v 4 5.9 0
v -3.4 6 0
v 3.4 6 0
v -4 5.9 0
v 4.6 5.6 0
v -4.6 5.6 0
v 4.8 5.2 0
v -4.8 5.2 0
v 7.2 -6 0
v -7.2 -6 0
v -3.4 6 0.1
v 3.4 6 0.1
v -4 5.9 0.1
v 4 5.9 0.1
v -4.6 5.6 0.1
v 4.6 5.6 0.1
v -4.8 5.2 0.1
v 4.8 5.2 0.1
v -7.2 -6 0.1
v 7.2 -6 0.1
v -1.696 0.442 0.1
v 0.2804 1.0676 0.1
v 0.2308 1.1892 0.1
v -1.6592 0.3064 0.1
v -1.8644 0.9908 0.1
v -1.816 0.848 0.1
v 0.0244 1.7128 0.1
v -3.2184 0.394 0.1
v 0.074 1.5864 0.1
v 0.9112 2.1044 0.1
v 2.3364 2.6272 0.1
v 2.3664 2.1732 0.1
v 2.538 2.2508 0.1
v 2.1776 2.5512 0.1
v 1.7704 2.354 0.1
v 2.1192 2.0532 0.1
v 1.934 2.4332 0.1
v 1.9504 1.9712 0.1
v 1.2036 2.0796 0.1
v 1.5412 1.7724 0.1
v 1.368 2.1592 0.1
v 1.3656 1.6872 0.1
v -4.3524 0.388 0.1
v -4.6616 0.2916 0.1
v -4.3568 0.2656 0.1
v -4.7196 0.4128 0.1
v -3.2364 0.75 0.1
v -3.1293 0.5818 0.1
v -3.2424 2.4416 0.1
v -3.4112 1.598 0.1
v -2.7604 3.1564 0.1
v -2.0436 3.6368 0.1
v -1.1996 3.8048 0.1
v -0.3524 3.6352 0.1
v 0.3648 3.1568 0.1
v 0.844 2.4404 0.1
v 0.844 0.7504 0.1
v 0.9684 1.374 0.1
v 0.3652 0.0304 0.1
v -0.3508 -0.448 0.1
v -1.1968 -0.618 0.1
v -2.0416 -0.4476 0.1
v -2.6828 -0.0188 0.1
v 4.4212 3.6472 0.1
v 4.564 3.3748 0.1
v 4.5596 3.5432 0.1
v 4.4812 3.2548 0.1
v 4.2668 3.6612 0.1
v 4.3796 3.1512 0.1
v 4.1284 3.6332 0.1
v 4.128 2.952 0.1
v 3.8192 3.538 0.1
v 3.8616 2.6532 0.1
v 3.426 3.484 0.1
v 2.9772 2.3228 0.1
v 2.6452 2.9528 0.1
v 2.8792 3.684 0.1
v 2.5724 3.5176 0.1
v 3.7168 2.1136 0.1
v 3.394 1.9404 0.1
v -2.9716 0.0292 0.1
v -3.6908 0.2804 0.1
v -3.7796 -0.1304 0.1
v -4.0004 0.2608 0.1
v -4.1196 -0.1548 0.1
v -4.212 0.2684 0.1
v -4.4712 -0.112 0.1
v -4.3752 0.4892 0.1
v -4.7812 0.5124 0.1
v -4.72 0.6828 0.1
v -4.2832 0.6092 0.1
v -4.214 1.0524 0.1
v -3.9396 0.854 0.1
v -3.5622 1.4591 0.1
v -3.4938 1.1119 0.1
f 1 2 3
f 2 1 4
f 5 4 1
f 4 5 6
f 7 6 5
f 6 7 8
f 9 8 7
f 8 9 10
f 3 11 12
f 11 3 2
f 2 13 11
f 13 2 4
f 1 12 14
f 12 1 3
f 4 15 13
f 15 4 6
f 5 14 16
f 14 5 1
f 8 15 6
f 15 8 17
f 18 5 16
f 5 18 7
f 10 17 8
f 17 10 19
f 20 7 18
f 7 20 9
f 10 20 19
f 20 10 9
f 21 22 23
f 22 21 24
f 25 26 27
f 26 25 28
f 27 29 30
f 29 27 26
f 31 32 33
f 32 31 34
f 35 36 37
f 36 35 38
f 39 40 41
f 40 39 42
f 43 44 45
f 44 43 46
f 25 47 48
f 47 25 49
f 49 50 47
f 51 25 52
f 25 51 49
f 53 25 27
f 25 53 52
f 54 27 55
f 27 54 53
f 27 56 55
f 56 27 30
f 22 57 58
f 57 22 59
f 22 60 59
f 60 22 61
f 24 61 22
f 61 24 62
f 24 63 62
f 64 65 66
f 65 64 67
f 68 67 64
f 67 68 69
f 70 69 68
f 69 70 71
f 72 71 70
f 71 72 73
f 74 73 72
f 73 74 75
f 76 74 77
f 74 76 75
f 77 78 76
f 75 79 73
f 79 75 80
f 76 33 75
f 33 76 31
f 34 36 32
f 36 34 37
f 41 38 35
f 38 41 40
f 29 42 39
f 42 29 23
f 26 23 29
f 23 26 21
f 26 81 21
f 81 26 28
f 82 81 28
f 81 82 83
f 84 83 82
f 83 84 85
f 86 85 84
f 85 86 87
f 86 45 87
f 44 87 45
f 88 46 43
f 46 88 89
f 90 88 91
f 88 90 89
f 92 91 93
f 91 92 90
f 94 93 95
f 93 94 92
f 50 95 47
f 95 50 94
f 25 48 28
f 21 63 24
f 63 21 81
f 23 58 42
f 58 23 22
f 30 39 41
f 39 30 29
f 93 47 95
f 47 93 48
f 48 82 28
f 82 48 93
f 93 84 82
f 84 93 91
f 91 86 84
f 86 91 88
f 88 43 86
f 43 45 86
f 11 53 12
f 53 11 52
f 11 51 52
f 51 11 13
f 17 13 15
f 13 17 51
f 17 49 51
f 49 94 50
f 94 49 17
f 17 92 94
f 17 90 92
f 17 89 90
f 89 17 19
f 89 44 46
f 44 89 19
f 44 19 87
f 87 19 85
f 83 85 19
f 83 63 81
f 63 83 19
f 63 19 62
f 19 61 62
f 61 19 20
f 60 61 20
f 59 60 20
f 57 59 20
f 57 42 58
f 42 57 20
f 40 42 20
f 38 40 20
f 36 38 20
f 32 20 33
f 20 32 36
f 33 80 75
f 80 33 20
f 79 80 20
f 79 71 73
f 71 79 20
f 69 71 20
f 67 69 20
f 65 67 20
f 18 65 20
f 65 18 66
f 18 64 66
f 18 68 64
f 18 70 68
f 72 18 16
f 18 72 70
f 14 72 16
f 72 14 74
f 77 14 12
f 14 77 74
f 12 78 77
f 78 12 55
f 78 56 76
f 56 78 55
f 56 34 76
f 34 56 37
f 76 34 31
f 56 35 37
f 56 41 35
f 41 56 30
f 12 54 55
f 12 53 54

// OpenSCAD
// file: ../p/4-4edge.scad
use <../lib.scad>
$fa=1; $fs=0.2;
function ldraw_lib__4_4edge(realsolid=false) = [
// 0 Circle 1.0
// 0 Name: 4-4edge.dat
// 0 Author: James Jessiman
// 0 !LDRAW_ORG Primitive UPDATE 2017-01
// 0 !LICENSE Licensed under CC BY 2.0 and CC BY 4.0 : see CAreadme.txt
// 
// 0 BFC CERTIFY CCW
  [0,"BFC","CERTIFY"],
  [0,"BFC","CCW"],
// 
// 0 !HISTORY 1998-12-15 [PTadmin] Official Update 1998-10
// 0 !HISTORY 2005-12-28 [PTadmin] Official Update 2005-01
// 0 !HISTORY 2007-06-24 [PTadmin] Header formatted for Contributor Agreement
// 0 !HISTORY 2008-07-01 [PTadmin] Official Update 2008-01
// 0 !HISTORY 2017-01-15 [Steffen] BFCed
// 0 !HISTORY 2017-12-30 [PTadmin] Official Update 2017-01
// 
// 
// 2 24 1 0 0 0.9239 0 0.3827
  [2,24,1,0,0,0.9239,0,0.3827],
// 2 24 0.9239 0 0.3827 0.7071 0 0.7071
  [2,24,0.9239,0,0.3827,0.7071,0,0.7071],
// 2 24 0.7071 0 0.7071 0.3827 0 0.9239
  [2,24,0.7071,0,0.7071,0.3827,0,0.9239],
// 2 24 0.3827 0 0.9239 0 0 1
  [2,24,0.3827,0,0.9239,0,0,1],
// 2 24 0 0 1 -0.3827 0 0.9239
  [2,24,0,0,1,-0.3827,0,0.9239],
// 2 24 -0.3827 0 0.9239 -0.7071 0 0.7071
  [2,24,-0.3827,0,0.9239,-0.7071,0,0.7071],
// 2 24 -0.7071 0 0.7071 -0.9239 0 0.3827
  [2,24,-0.7071,0,0.7071,-0.9239,0,0.3827],
// 2 24 -0.9239 0 0.3827 -1 0 -0
  [2,24,-0.9239,0,0.3827,-1,0,-0],
// 2 24 -1 0 -0 -0.9239 0 -0.3827
  [2,24,-1,0,-0,-0.9239,0,-0.3827],
// 2 24 -0.9239 0 -0.3827 -0.7071 0 -0.7071
  [2,24,-0.9239,0,-0.3827,-0.7071,0,-0.7071],
// 2 24 -0.7071 0 -0.7071 -0.3827 0 -0.9239
  [2,24,-0.7071,0,-0.7071,-0.3827,0,-0.9239],
// 2 24 -0.3827 0 -0.9239 0 0 -1
  [2,24,-0.3827,0,-0.9239,0,0,-1],
// 2 24 0 0 -1 0.3827 0 -0.9239
  [2,24,0,0,-1,0.3827,0,-0.9239],
// 2 24 0.3827 0 -0.9239 0.7071 0 -0.7071
  [2,24,0.3827,0,-0.9239,0.7071,0,-0.7071],
// 2 24 0.7071 0 -0.7071 0.9239 0 -0.3827
  [2,24,0.7071,0,-0.7071,0.9239,0,-0.3827],
// 2 24 0.9239 0 -0.3827 1 0 0
  [2,24,0.9239,0,-0.3827,1,0,0],
];
module ldraw_lib__4_4edge(step=0, col=false, unit=2/5, alt=false, line=0.2, solid=!$preview)
    makepoly(ldraw_lib__4_4edge(solid), step=step, col=col, unit=unit, alt=alt, line=line, solid=solid);
ldraw_lib__4_4edge(line=0.2);
// file: ../p/4-4disc.scad
use <../lib.scad>
$fa=1; $fs=0.2;
function ldraw_lib__4_4disc(realsolid=false) = [
// 0 Disc 1.0
// 0 Name: 4-4disc.dat
// 0 Author: James Jessiman
// 0 !LDRAW_ORG Primitive UPDATE 2002-02
// 0 !LICENSE Licensed under CC BY 2.0 and CC BY 4.0 : see CAreadme.txt
// 
// 0 BFC CERTIFY CCW
  [0,"BFC","CERTIFY"],
  [0,"BFC","CCW"],
// 
// 0 !HISTORY 1998-12-15 [PTadmin] Official Update 1998-10
// 0 !HISTORY 2002-03-23 [sbliss] Added BFC statement
// 0 !HISTORY 2002-04-25 [PTadmin] Official Update 2002-02
// 0 !HISTORY 2007-06-24 [PTadmin] Header formatted for Contributor Agreement
// 0 !HISTORY 2008-07-01 [PTadmin] Official Update 2008-01
// 
// 
// 3 16 0 0 0 1 0 0 0.9239 0 0.3827
  [3,16,0,0,0,1,0,0,0.9239,0,0.3827],
// 3 16 0 0 0 0.9239 0 0.3827 0.7071 0 0.7071
  [3,16,0,0,0,0.9239,0,0.3827,0.7071,0,0.7071],
// 3 16 0 0 0 0.7071 0 0.7071 0.3827 0 0.9239
  [3,16,0,0,0,0.7071,0,0.7071,0.3827,0,0.9239],
// 3 16 0 0 0 0.3827 0 0.9239 0 0 1
  [3,16,0,0,0,0.3827,0,0.9239,0,0,1],
// 3 16 0 0 0 0 0 1 -0.3827 0 0.9239
  [3,16,0,0,0,0,0,1,-0.3827,0,0.9239],
// 3 16 0 0 0 -0.3827 0 0.9239 -0.7071 0 0.7071
  [3,16,0,0,0,-0.3827,0,0.9239,-0.7071,0,0.7071],
// 3 16 0 0 0 -0.7071 0 0.7071 -0.9239 0 0.3827
  [3,16,0,0,0,-0.7071,0,0.7071,-0.9239,0,0.3827],
// 3 16 0 0 0 -0.9239 0 0.3827 -1 0 -0
  [3,16,0,0,0,-0.9239,0,0.3827,-1,0,-0],
// 3 16 0 0 0 -1 0 -0 -0.9239 0 -0.3827
  [3,16,0,0,0,-1,0,-0,-0.9239,0,-0.3827],
// 3 16 0 0 0 -0.9239 0 -0.3827 -0.7071 0 -0.7071
  [3,16,0,0,0,-0.9239,0,-0.3827,-0.7071,0,-0.7071],
// 3 16 0 0 0 -0.7071 0 -0.7071 -0.3827 0 -0.9239
  [3,16,0,0,0,-0.7071,0,-0.7071,-0.3827,0,-0.9239],
// 3 16 0 0 0 -0.3827 0 -0.9239 0 0 -1
  [3,16,0,0,0,-0.3827,0,-0.9239,0,0,-1],
// 3 16 0 0 0 0 0 -1 0.3827 0 -0.9239
  [3,16,0,0,0,0,0,-1,0.3827,0,-0.9239],
// 3 16 0 0 0 0.3827 0 -0.9239 0.7071 0 -0.7071
  [3,16,0,0,0,0.3827,0,-0.9239,0.7071,0,-0.7071],
// 3 16 0 0 0 0.7071 0 -0.7071 0.9239 0 -0.3827
  [3,16,0,0,0,0.7071,0,-0.7071,0.9239,0,-0.3827],
// 3 16 0 0 0 0.9239 0 -0.3827 1 0 0
  [3,16,0,0,0,0.9239,0,-0.3827,1,0,0],
// 0
];
module ldraw_lib__4_4disc(step=0, col=false, unit=2/5, alt=false, line=0.2, solid=!$preview)
    makepoly(ldraw_lib__4_4disc(solid), step=step, col=col, unit=unit, alt=alt, line=line, solid=solid);
ldraw_lib__4_4disc(line=0.2);
// file: ../p/4-4cyli.scad
use <../lib.scad>
$fa=1; $fs=0.2;
function ldraw_lib__4_4cyli(realsolid=false) = [
// 0 Cylinder 1.0
// 0 Name: 4-4cyli.dat
// 0 Author: James Jessiman
// 0 !LDRAW_ORG Primitive UPDATE 2005-01
// 0 !LICENSE Licensed under CC BY 2.0 and CC BY 4.0 : see CAreadme.txt
// 
// 0 BFC CERTIFY CCW
  [0,"BFC","CERTIFY"],
  [0,"BFC","CCW"],
// 
// 0 !HISTORY 1998-12-15 [PTadmin] Official Update 1998-10
// 0 !HISTORY 2002-03-23 [sbliss] Added BFC statement; merged headers from files in distributions LDraw 0.27 and Complete.
// 0 !HISTORY 2002-04-25 [PTadmin] Official Update 2002-02
// 0 !HISTORY 2004-12-14 [guyvivan] BFC CCW
// 0 !HISTORY 2005-12-28 [PTadmin] Official Update 2005-01
// 0 !HISTORY 2007-06-24 [PTadmin] Header formatted for Contributor Agreement
// 0 !HISTORY 2008-07-01 [PTadmin] Official Update 2008-01
// 
// 
// 4 16 1 1 0 0.9239 1 0.3827 0.9239 0 0.3827 1 0 0
  [4,16,1,1,0,0.9239,1,0.3827,0.9239,0,0.3827,1,0,0],
// 5 24 1 0 0 1 1 0 0.9239 0 0.3827 0.9239 0 -0.3827
  [5,24,1,0,0,1,1,0,0.9239,0,0.3827,0.9239,0,-0.3827],
// 4 16 0.9239 1 0.3827 0.7071 1 0.7071 0.7071 0 0.7071 0.9239 0 0.3827
  [4,16,0.9239,1,0.3827,0.7071,1,0.7071,0.7071,0,0.7071,0.9239,0,0.3827],
// 5 24 0.9239 0 0.3827 0.9239 1 0.3827 0.7071 0 0.7071 1 0 0
  [5,24,0.9239,0,0.3827,0.9239,1,0.3827,0.7071,0,0.7071,1,0,0],
// 4 16 0.7071 1 0.7071 0.3827 1 0.9239 0.3827 0 0.9239 0.7071 0 0.7071
  [4,16,0.7071,1,0.7071,0.3827,1,0.9239,0.3827,0,0.9239,0.7071,0,0.7071],
// 5 24 0.7071 0 0.7071 0.7071 1 0.7071 0.3827 0 0.9239 0.9239 0 0.3827
  [5,24,0.7071,0,0.7071,0.7071,1,0.7071,0.3827,0,0.9239,0.9239,0,0.3827],
// 4 16 0.3827 1 0.9239 0 1 1 0 0 1 0.3827 0 0.9239
  [4,16,0.3827,1,0.9239,0,1,1,0,0,1,0.3827,0,0.9239],
// 5 24 0.3827 0 0.9239 0.3827 1 0.9239 0 0 1 0.7071 0 0.7071
  [5,24,0.3827,0,0.9239,0.3827,1,0.9239,0,0,1,0.7071,0,0.7071],
// 4 16 0 1 1 -0.3827 1 0.9239 -0.3827 0 0.9239 0 0 1
  [4,16,0,1,1,-0.3827,1,0.9239,-0.3827,0,0.9239,0,0,1],
// 5 24 0 0 1 0 1 1 -0.3827 0 0.9239 0.3827 0 0.9239
  [5,24,0,0,1,0,1,1,-0.3827,0,0.9239,0.3827,0,0.9239],
// 4 16 -0.3827 1 0.9239 -0.7071 1 0.7071 -0.7071 0 0.7071 -0.3827 0 0.9239
  [4,16,-0.3827,1,0.9239,-0.7071,1,0.7071,-0.7071,0,0.7071,-0.3827,0,0.9239],
// 5 24 -0.3827 0 0.9239 -0.3827 1 0.9239 -0.7071 0 0.7071 0 0 1
  [5,24,-0.3827,0,0.9239,-0.3827,1,0.9239,-0.7071,0,0.7071,0,0,1],
// 4 16 -0.7071 1 0.7071 -0.9239 1 0.3827 -0.9239 0 0.3827 -0.7071 0 0.7071
  [4,16,-0.7071,1,0.7071,-0.9239,1,0.3827,-0.9239,0,0.3827,-0.7071,0,0.7071],
// 5 24 -0.7071 0 0.7071 -0.7071 1 0.7071 -0.9239 0 0.3827 -0.3827 0 0.9239
  [5,24,-0.7071,0,0.7071,-0.7071,1,0.7071,-0.9239,0,0.3827,-0.3827,0,0.9239],
// 4 16 -0.9239 1 0.3827 -1 1 0 -1 0 0 -0.9239 0 0.3827
  [4,16,-0.9239,1,0.3827,-1,1,0,-1,0,0,-0.9239,0,0.3827],
// 5 24 -0.9239 0 0.3827 -0.9239 1 0.3827 -1 0 0 -0.7071 0 0.7071
  [5,24,-0.9239,0,0.3827,-0.9239,1,0.3827,-1,0,0,-0.7071,0,0.7071],
// 4 16 -1 1 0 -0.9239 1 -0.3827 -0.9239 0 -0.3827 -1 0 0
  [4,16,-1,1,0,-0.9239,1,-0.3827,-0.9239,0,-0.3827,-1,0,0],
// 5 24 -1 0 0 -1 1 0 -0.9239 0 -0.3827 -0.9239 0 0.3827
  [5,24,-1,0,0,-1,1,0,-0.9239,0,-0.3827,-0.9239,0,0.3827],
// 4 16 -0.9239 1 -0.3827 -0.7071 1 -0.7071 -0.7071 0 -0.7071 -0.9239 0 -0.3827
  [4,16,-0.9239,1,-0.3827,-0.7071,1,-0.7071,-0.7071,0,-0.7071,-0.9239,0,-0.3827],
// 5 24 -0.9239 0 -0.3827 -0.9239 1 -0.3827 -0.7071 0 -0.7071 -1 0 0
  [5,24,-0.9239,0,-0.3827,-0.9239,1,-0.3827,-0.7071,0,-0.7071,-1,0,0],
// 4 16 -0.7071 1 -0.7071 -0.3827 1 -0.9239 -0.3827 0 -0.9239 -0.7071 0 -0.7071
  [4,16,-0.7071,1,-0.7071,-0.3827,1,-0.9239,-0.3827,0,-0.9239,-0.7071,0,-0.7071],
// 5 24 -0.7071 0 -0.7071 -0.7071 1 -0.7071 -0.3827 0 -0.9239 -0.9239 0 -0.3827
  [5,24,-0.7071,0,-0.7071,-0.7071,1,-0.7071,-0.3827,0,-0.9239,-0.9239,0,-0.3827],
// 4 16 -0.3827 1 -0.9239 0 1 -1 0 0 -1 -0.3827 0 -0.9239
  [4,16,-0.3827,1,-0.9239,0,1,-1,0,0,-1,-0.3827,0,-0.9239],
// 5 24 -0.3827 0 -0.9239 -0.3827 1 -0.9239 0 0 -1 -0.7071 0 -0.7071
  [5,24,-0.3827,0,-0.9239,-0.3827,1,-0.9239,0,0,-1,-0.7071,0,-0.7071],
// 4 16 0 1 -1 0.3827 1 -0.9239 0.3827 0 -0.9239 0 0 -1
  [4,16,0,1,-1,0.3827,1,-0.9239,0.3827,0,-0.9239,0,0,-1],
// 5 24 0 0 -1 0 1 -1 0.3827 0 -0.9239 -0.3827 0 -0.9239
  [5,24,0,0,-1,0,1,-1,0.3827,0,-0.9239,-0.3827,0,-0.9239],
// 4 16 0.3827 1 -0.9239 0.7071 1 -0.7071 0.7071 0 -0.7071 0.3827 0 -0.9239
  [4,16,0.3827,1,-0.9239,0.7071,1,-0.7071,0.7071,0,-0.7071,0.3827,0,-0.9239],
// 5 24 0.3827 0 -0.9239 0.3827 1 -0.9239 0.7071 0 -0.7071 0 0 -1
  [5,24,0.3827,0,-0.9239,0.3827,1,-0.9239,0.7071,0,-0.7071,0,0,-1],
// 4 16 0.7071 1 -0.7071 0.9239 1 -0.3827 0.9239 0 -0.3827 0.7071 0 -0.7071
  [4,16,0.7071,1,-0.7071,0.9239,1,-0.3827,0.9239,0,-0.3827,0.7071,0,-0.7071],
// 5 24 0.7071 0 -0.7071 0.7071 1 -0.7071 0.9239 0 -0.3827 0.3827 0 -0.9239
  [5,24,0.7071,0,-0.7071,0.7071,1,-0.7071,0.9239,0,-0.3827,0.3827,0,-0.9239],
// 4 16 0.9239 1 -0.3827 1 1 0 1 0 0 0.9239 0 -0.3827
  [4,16,0.9239,1,-0.3827,1,1,0,1,0,0,0.9239,0,-0.3827],
// 5 24 0.9239 0 -0.3827 0.9239 1 -0.3827 1 0 0 0.7071 0 -0.7071
  [5,24,0.9239,0,-0.3827,0.9239,1,-0.3827,1,0,0,0.7071,0,-0.7071],
// 0
];
module ldraw_lib__4_4cyli(step=0, col=false, unit=2/5, alt=false, line=0.2, solid=!$preview)
    makepoly(ldraw_lib__4_4cyli(solid), step=step, col=col, unit=unit, alt=alt, line=line, solid=solid);
ldraw_lib__4_4cyli(line=0.2);
// file: ../p/stud3.scad
use <../lib.scad>
use <4-4cyli.scad>
use <4-4disc.scad>
use <4-4edge.scad>
$fa=1; $fs=0.2;
function ldraw_lib__stud3(realsolid=false) = realsolid ? 
    [openscad(translate([0,0,-eps()], o=cylinder(4+eps(), r=4)),2)] : [
// 0 Stud Tube Solid
// 0 Name: stud3.dat
// 0 Author: James Jessiman
// 0 !LDRAW_ORG Primitive UPDATE 2012-01
// 0 !LICENSE Licensed under CC BY 2.0 and CC BY 4.0 : see CAreadme.txt
// 
// 0 BFC CERTIFY CCW
  [0,"BFC","CERTIFY"],
  [0,"BFC","CCW"],
// 
// 0 !HISTORY 2002-04-04 [sbliss] Modified for BFC compliance
// 0 !HISTORY 2002-04-25 [PTadmin] Official Update 2002-02
// 0 !HISTORY 2007-06-24 [PTadmin] Header formatted for Contributor Agreement
// 0 !HISTORY 2008-07-01 [PTadmin] Official Update 2008-01
// 0 !HISTORY 2012-02-16 [Philo] Changed to CCW
// 0 !HISTORY 2012-03-30 [PTadmin] Official Update 2012-01
// 
// 
// 1 16 0 -4 0 4 0 0 0 1 0 0 0 4 4-4edge.dat
  [1,16,0,-4,0,4,0,0,0,1,0,0,0,4, ldraw_lib__4_4edge(realsolid)],
// 1 16 0 0 0 4 0 0 0 1 0 0 0 4 4-4edge.dat
  [1,16,0,0,0,4,0,0,0,1,0,0,0,4, ldraw_lib__4_4edge(realsolid)],
// 1 16 0 -4 0 4 0 0 0 1 0 0 0 4 4-4disc.dat
  [1,16,0,-4,0,4,0,0,0,1,0,0,0,4, ldraw_lib__4_4disc(realsolid)],
// 1 16 0 -4 0 4 0 0 0 4 0 0 0 4 4-4cyli.dat
  [1,16,0,-4,0,4,0,0,0,4,0,0,0,4, ldraw_lib__4_4cyli(realsolid)],
];
module ldraw_lib__stud3(step=0, col=false, unit=2/5, alt=false, line=0.2, solid=!$preview)
    makepoly(ldraw_lib__stud3(solid), step=step, col=col, unit=unit, alt=alt, line=line, solid=solid);
ldraw_lib__stud3(line=0.2);
// file: ../p/stud.scad
use <../lib.scad>
use <4-4cyli.scad>
use <4-4disc.scad>
use <4-4edge.scad>
$fa=1; $fs=0.2;
function ldraw_lib__stud(realsolid=false) = realsolid ? 
    [openscad(translate([0,0,-eps()], o=cylinder(4+eps(), r=6)),2)] : [
// 0 Stud
// 0 Name: stud.dat
// 0 Author: James Jessiman
// 0 !LDRAW_ORG Primitive UPDATE 2012-01
// 0 !LICENSE Licensed under CC BY 2.0 and CC BY 4.0 : see CAreadme.txt
// 
// 0 BFC CERTIFY CCW
  [0,"BFC","CERTIFY"],
  [0,"BFC","CCW"],
// 
// 0 !HISTORY 2002-04-04 [sbliss] Modified for BFC compliance
// 0 !HISTORY 2002-04-25 [PTadmin] Official Update 2002-02
// 0 !HISTORY 2007-06-24 [PTadmin] Header formatted for Contributor Agreement
// 0 !HISTORY 2008-07-01 [PTadmin] Official Update 2008-01
// 0 !HISTORY 2012-02-16 [Philo] Changed to CCW
// 0 !HISTORY 2012-03-30 [PTadmin] Official Update 2012-01
// 
// 
// 1 16 0 0 0 6 0 0 0 1 0 0 0 6 4-4edge.dat
  [1,16,0,0,0,6,0,0,0,1,0,0,0,6, ldraw_lib__4_4edge(realsolid)],
// 1 16 0 -4 0 6 0 0 0 1 0 0 0 6 4-4edge.dat
  [1,16,0,-4,0,6,0,0,0,1,0,0,0,6, ldraw_lib__4_4edge(realsolid)],
// 1 16 0 0 0 6 0 0 0 -4 0 0 0 6 4-4cyli.dat
  [1,16,0,0,0,6,0,0,0,-4,0,0,0,6, ldraw_lib__4_4cyli(realsolid)],
// 1 16 0 -4 0 6 0 0 0 1 0 0 0 6 4-4disc.dat
  [1,16,0,-4,0,6,0,0,0,1,0,0,0,6, ldraw_lib__4_4disc(realsolid)],
];
module ldraw_lib__stud(step=0, col=false, unit=2/5, alt=false, line=0.2, solid=!$preview)
    makepoly(ldraw_lib__stud(solid), step=step, col=col, unit=unit, alt=alt, line=line, solid=solid);
ldraw_lib__stud(line=0.2);
// file: ../p/box5.scad
use <../lib.scad>
$fa=1; $fs=0.2;
function ldraw_lib__box5(realsolid=false) = [
// 0 Box with 5 Faces and All Edges
// 0 Name: box5.dat
// 0 Author: James Jessiman
// 0 !LDRAW_ORG Primitive UPDATE 2012-01
// 0 !LICENSE Licensed under CC BY 2.0 and CC BY 4.0 : see CAreadme.txt
// 
// 0 BFC CERTIFY CCW
  [0,"BFC","CERTIFY"],
  [0,"BFC","CCW"],
// 
// 0 !HISTORY 2002-04-03 [sbliss] Modified for BFC compliance
// 0 !HISTORY 2002-04-25 [PTadmin] Official Update 2002-02
// 0 !HISTORY 2007-06-24 [PTadmin] Header formatted for Contributor Agreement
// 0 !HISTORY 2008-07-01 [PTadmin] Official Update 2008-01
// 0 !HISTORY 2012-02-16 [Philo] Changed to CCW
// 0 !HISTORY 2012-03-30 [PTadmin] Official Update 2012-01
// 
// 
// 2 24 1 1 1 -1 1 1
  [2,24,1,1,1,-1,1,1],
// 2 24 -1 1 1 -1 1 -1
  [2,24,-1,1,1,-1,1,-1],
// 2 24 -1 1 -1 1 1 -1
  [2,24,-1,1,-1,1,1,-1],
// 2 24 1 1 -1 1 1 1
  [2,24,1,1,-1,1,1,1],
// 2 24 1 0 1 -1 0 1
  [2,24,1,0,1,-1,0,1],
// 2 24 -1 0 1 -1 0 -1
  [2,24,-1,0,1,-1,0,-1],
// 2 24 -1 0 -1 1 0 -1
  [2,24,-1,0,-1,1,0,-1],
// 2 24 1 0 -1 1 0 1
  [2,24,1,0,-1,1,0,1],
// 2 24 1 0 1 1 1 1
  [2,24,1,0,1,1,1,1],
// 2 24 -1 0 1 -1 1 1
  [2,24,-1,0,1,-1,1,1],
// 2 24 1 0 -1 1 1 -1
  [2,24,1,0,-1,1,1,-1],
// 2 24 -1 0 -1 -1 1 -1
  [2,24,-1,0,-1,-1,1,-1],
// 4 16 -1 1 1 1 1 1 1 1 -1 -1 1 -1
  [4,16,-1,1,1,1,1,1,1,1,-1,-1,1,-1],
// 4 16 -1 1 1 -1 0 1 1 0 1 1 1 1
  [4,16,-1,1,1,-1,0,1,1,0,1,1,1,1],
// 4 16 -1 1 -1 -1 0 -1 -1 0 1 -1 1 1
  [4,16,-1,1,-1,-1,0,-1,-1,0,1,-1,1,1],
// 4 16 1 1 -1 1 0 -1 -1 0 -1 -1 1 -1
  [4,16,1,1,-1,1,0,-1,-1,0,-1,-1,1,-1],
// 4 16 1 1 1 1 0 1 1 0 -1 1 1 -1
  [4,16,1,1,1,1,0,1,1,0,-1,1,1,-1],
];
module ldraw_lib__box5(step=0, col=false, unit=2/5, alt=false, line=0.2, solid=!$preview)
    makepoly(ldraw_lib__box5(solid), step=step, col=col, unit=unit, alt=alt, line=line, solid=solid);
ldraw_lib__box5(line=0.2);
// file: ../p/box4t.scad
use <../lib.scad>
$fa=1; $fs=0.2;
function ldraw_lib__box4t(realsolid=false) = [
// 0 Box with 4 Adjacent Faces and All Edges
// 0 Name: box4t.dat
// 0 Author: Tore Eriksson [Tore_Eriksson]
// 0 !LDRAW_ORG Primitive UPDATE 2003-02
// 0 !LICENSE Licensed under CC BY 2.0 and CC BY 4.0 : see CAreadme.txt
// 
// 0 BFC CERTIFY CCW
  [0,"BFC","CERTIFY"],
  [0,"BFC","CCW"],
// 
// 0 !HISTORY 1997-09-29 [PTadmin] Official Update 1997-15
// 0 !HISTORY 2002-08-31 [izanette] Modified with WINDZ for BFC compliance
// 0 !HISTORY 2003-08-01 [PTadmin] Official Update 2003-02
// 0 !HISTORY 2007-06-24 [PTadmin] Header formatted for Contributor Agreement
// 0 !HISTORY 2008-07-01 [PTadmin] Official Update 2008-01
// 
// 
// 2 24 1 1 1 -1 1 1
  [2,24,1,1,1,-1,1,1],
// 2 24 -1 1 1 -1 1 -1
  [2,24,-1,1,1,-1,1,-1],
// 2 24 -1 1 -1 1 1 -1
  [2,24,-1,1,-1,1,1,-1],
// 2 24 1 1 -1 1 1 1
  [2,24,1,1,-1,1,1,1],
// 2 24 1 0 1 -1 0 1
  [2,24,1,0,1,-1,0,1],
// 2 24 -1 0 1 -1 0 -1
  [2,24,-1,0,1,-1,0,-1],
// 2 24 -1 0 -1 1 0 -1
  [2,24,-1,0,-1,1,0,-1],
// 2 24 1 0 -1 1 0 1
  [2,24,1,0,-1,1,0,1],
// 2 24 1 0 1 1 1 1
  [2,24,1,0,1,1,1,1],
// 2 24 -1 0 1 -1 1 1
  [2,24,-1,0,1,-1,1,1],
// 2 24 1 0 -1 1 1 -1
  [2,24,1,0,-1,1,1,-1],
// 2 24 -1 0 -1 -1 1 -1
  [2,24,-1,0,-1,-1,1,-1],
// 4 16 1 1 1 1 1 -1 -1 1 -1 -1 1 1
  [4,16,1,1,1,1,1,-1,-1,1,-1,-1,1,1],
// 4 16 1 1 1 -1 1 1 -1 0 1 1 0 1
  [4,16,1,1,1,-1,1,1,-1,0,1,1,0,1],
// 4 16 -1 1 1 -1 1 -1 -1 0 -1 -1 0 1
  [4,16,-1,1,1,-1,1,-1,-1,0,-1,-1,0,1],
// 0 4 16 -1 1 -1 -1 0 -1 1 0 -1 1 1 -1
// 4 16 1 1 -1 1 1 1 1 0 1 1 0 -1
  [4,16,1,1,-1,1,1,1,1,0,1,1,0,-1],
// 0
];
module ldraw_lib__box4t(step=0, col=false, unit=2/5, alt=false, line=0.2, solid=!$preview)
    makepoly(ldraw_lib__box4t(solid), step=step, col=col, unit=unit, alt=alt, line=line, solid=solid);
ldraw_lib__box4t(line=0.2);
// file: s/3004s01.scad
use <../../lib.scad>
use <../../p/box4t.scad>
use <../../p/box5.scad>
use <../../p/stud.scad>
use <../../p/stud3.scad>
$fa=1; $fs=0.2;
function ldraw_lib__s__3004s01(realsolid=false) = [
// 0 ~Brick  1 x  2 without Front Face
// 0 Name: s\3004s01.dat
// 0 Author: James Jessiman
// 0 !LDRAW_ORG Subpart UPDATE 2003-03
// 0 !LICENSE Licensed under CC BY 2.0 and CC BY 4.0 : see CAreadme.txt
// 
// 0 BFC CERTIFY CCW
  [0,"BFC","CERTIFY"],
  [0,"BFC","CCW"],
// 
// 0 !HISTORY 2003-09-07 [jriley] Subfiling, BFC
// 0 !HISTORY 2003-12-19 [PTadmin] Official Update 2003-03
// 0 !HISTORY 2007-08-29 [PTadmin] Header formatted for Contributor Agreement
// 0 !HISTORY 2008-07-01 [PTadmin] Official Update 2008-01
// 
// 
// 1 16 0 4 0 1 0 0 0 -5 0 0 0 1 stud3.dat
  [1,16,0,4,0,1,0,0,0,-5,0,0,0,1, ldraw_lib__stud3(realsolid)],
// 0 BFC INVERTNEXT
  [0,"BFC","INVERTNEXT"],
// 1 16 0 24 0 16 0 0 0 -20 0 0 0 6 box5.dat
  [1,16,0,24,0,16,0,0,0,-20,0,0,0,6, ldraw_lib__box5(realsolid)],
// 4 16 20 24 10 16 24 6 -16 24 6 -20 24 10
  [4,16,20,24,10,16,24,6,-16,24,6,-20,24,10],
// 4 16 -20 24 10 -16 24 6 -16 24 -6 -20 24 -10
  [4,16,-20,24,10,-16,24,6,-16,24,-6,-20,24,-10],
// 4 16 -20 24 -10 -16 24 -6 16 24 -6 20 24 -10
  [4,16,-20,24,-10,-16,24,-6,16,24,-6,20,24,-10],
// 4 16 20 24 -10 16 24 -6 16 24 6 20 24 10
  [4,16,20,24,-10,16,24,-6,16,24,6,20,24,10],
// 1 16 0 24 0 20 0 0 0 -24 0 0 0 10 box4t.dat
  [1,16,0,24,0,20,0,0,0,-24,0,0,0,10, ldraw_lib__box4t(realsolid)],
// 1 16 10 0 0 1 0 0 0 1 0 0 0 1 stud.dat
  [1,16,10,0,0,1,0,0,0,1,0,0,0,1, ldraw_lib__stud(realsolid)],
// 1 16 -10 0 0 1 0 0 0 1 0 0 0 1 stud.dat
  [1,16,-10,0,0,1,0,0,0,1,0,0,0,1, ldraw_lib__stud(realsolid)],
// 0
];
module ldraw_lib__s__3004s01(step=0, col=false, unit=2/5, alt=false, line=0.2, solid=!$preview)
    makepoly(ldraw_lib__s__3004s01(solid), step=step, col=col, unit=unit, alt=alt, line=line, solid=solid);
ldraw_lib__s__3004s01(line=0.2);
// file: 3004.scad
use <../lib.scad>
use <s/3004s01.scad>
$fa=1; $fs=0.2;
function ldraw_lib__3004(realsolid=false) = [
// 0 Brick  1 x  2
// 0 Name: 3004.dat
// 0 Author: James Jessiman
// 0 !LDRAW_ORG Part UPDATE 2022-05
// 0 !LICENSE Licensed under CC BY 2.0 and CC BY 4.0 : see CAreadme.txt
// 
// 0 BFC CERTIFY CCW
  [0,"BFC","CERTIFY"],
  [0,"BFC","CCW"],
// 
// 0 !HISTORY 2001-10-26 [PTadmin] Official Update 2001-01
// 0 !HISTORY 2002-05-07 {unknown} BFC Certification
// 0 !HISTORY 2002-06-11 [PTadmin] Official Update 2002-03
// 0 !HISTORY 2007-05-07 [PTadmin] Header formatted for Contributor Agreement
// 0 !HISTORY 2008-07-01 [PTadmin] Official Update 2008-01
// 0 !HISTORY 2022-08-04 [MagFors] Using subfile
// 0 !HISTORY 2022-09-15 [PTadmin] Official Update 2022-05
// 
// 
// 1 16 0 0 0 1 0 0 0 1 0 0 0 1 s\3004s01.dat
  [1,16,0,0,0,1,0,0,0,1,0,0,0,1, ldraw_lib__s__3004s01(realsolid)],
// 4 16 -20 24 -10 20 24 -10 20 0 -10 -20 0 -10
  [4,16,-20,24,-10,20,24,-10,20,0,-10,-20,0,-10],
];
module ldraw_lib__3004(step=0, col=false, unit=2/5, alt=false, line=0.2, solid=!$preview)
    makepoly(ldraw_lib__3004(solid), step=step, col=col, unit=unit, alt=alt, line=line, solid=solid);
ldraw_lib__3004(line=0.2);
// file: s/004315s01.scad
use <../../lib.scad>
$fa=1; $fs=0.2;
function ldraw_lib__s__004315s01(realsolid=false) = [
// 0 ~Sticker for Minifig Torso without Top Surface
// 0 Name: s\004315s01.dat
// 0 Author: Michael Heidemann [mikeheide]
// 0 !LDRAW_ORG Subpart UPDATE 2018-02
// 0 !LICENSE Licensed under CC BY 2.0 and CC BY 4.0 : see CAreadme.txt
// 
// 0 BFC CERTIFY CCW
  [0,"BFC","CERTIFY"],
  [0,"BFC","CCW"],
// 
// 0 !HISTORY 2011-12-29 [PTadmin] Official Update 2011-02
// 0 !HISTORY 2017-07-04 [cwdee] Add conditional lines in border
// 0 !HISTORY 2018-12-08 [PTadmin] Official Update 2018-02
// 
// 
// 0 // Back
// 
// 4 16 8.5 0 15 10 0 14.75 -10 0 14.75 -8.5 0 15
  [4,16,8.5,0,15,10,0,14.75,-10,0,14.75,-8.5,0,15],
// 4 16 10 0 14.75 11.5 0 14 -11.5 0 14 -10 0 14.75
  [4,16,10,0,14.75,11.5,0,14,-11.5,0,14,-10,0,14.75],
// 4 16 11.5 0 14 12 0 13 -12 0 13 -11.5 0 14
  [4,16,11.5,0,14,12,0,13,-12,0,13,-11.5,0,14],
// 4 16 12 0 13 18 0 -15 -18 0 -15 -12 0 13
  [4,16,12,0,13,18,0,-15,-18,0,-15,-12,0,13],
// 0 // Border
// 4 16 8.5 0 15 -8.5 0 15 -8.5 -0.25 15 8.5 -0.25 15
  [4,16,8.5,0,15,-8.5,0,15,-8.5,-0.25,15,8.5,-0.25,15],
// 4 16 -8.5 0 15 -10 0 14.75 -10 -0.25 14.75 -8.5 -0.25 15
  [4,16,-8.5,0,15,-10,0,14.75,-10,-0.25,14.75,-8.5,-0.25,15],
// 4 16 8.5 -0.25 15 10 -0.25 14.75 10 0 14.75 8.5 0 15
  [4,16,8.5,-0.25,15,10,-0.25,14.75,10,0,14.75,8.5,0,15],
// 4 16 -10 0 14.75 -11.5 0 14 -11.5 -0.25 14 -10 -0.25 14.75
  [4,16,-10,0,14.75,-11.5,0,14,-11.5,-0.25,14,-10,-0.25,14.75],
// 4 16 10 -0.25 14.75 11.5 -0.25 14 11.5 0 14 10 0 14.75
  [4,16,10,-0.25,14.75,11.5,-0.25,14,11.5,0,14,10,0,14.75],
// 4 16 -11.5 0 14 -12 0 13 -12 -0.25 13 -11.5 -0.25 14
  [4,16,-11.5,0,14,-12,0,13,-12,-0.25,13,-11.5,-0.25,14],
// 4 16 11.5 -0.25 14 12 -0.25 13 12 0 13 11.5 0 14
  [4,16,11.5,-0.25,14,12,-0.25,13,12,0,13,11.5,0,14],
// 4 16 -18 -0.25 -15 -12 -0.25 13 -12 0 13 -18 0 -15
  [4,16,-18,-0.25,-15,-12,-0.25,13,-12,0,13,-18,0,-15],
// 4 16 18 0 -15 12 0 13 12 -0.25 13 18 -0.25 -15
  [4,16,18,0,-15,12,0,13,12,-0.25,13,18,-0.25,-15],
// 4 16 -18 0 -15 18 0 -15 18 -0.25 -15 -18 -0.25 -15
  [4,16,-18,0,-15,18,0,-15,18,-0.25,-15,-18,-0.25,-15],
// 0 // Border conditional lines
// 5 24 8.5 0 15 8.5 -0.25 15 0 0 15 10 0 14.75
  [5,24,8.5,0,15,8.5,-0.25,15,0,0,15,10,0,14.75],
// 5 24 10 0 14.75 10 -0.25 14.75 8.5 0 15 11.5 0 14
  [5,24,10,0,14.75,10,-0.25,14.75,8.5,0,15,11.5,0,14],
// 5 24 11.5 0 14 11.5 -0.25 14 10 0 14.75 12 0 13
  [5,24,11.5,0,14,11.5,-0.25,14,10,0,14.75,12,0,13],
// 5 24 12 0 13 12 -0.25 13 11.5 0 14 18 0 -15
  [5,24,12,0,13,12,-0.25,13,11.5,0,14,18,0,-15],
// 5 24 -8.5 0 15 -8.5 -0.25 15 0 0 15 -10 0 14.75
  [5,24,-8.5,0,15,-8.5,-0.25,15,0,0,15,-10,0,14.75],
// 5 24 -10 0 14.75 -10 -0.25 14.75 -8.5 0 15 -11.5 0 14
  [5,24,-10,0,14.75,-10,-0.25,14.75,-8.5,0,15,-11.5,0,14],
// 5 24 -11.5 0 14 -11.5 -0.25 14 -10 0 14.75 -12 0 13
  [5,24,-11.5,0,14,-11.5,-0.25,14,-10,0,14.75,-12,0,13],
// 5 24 -12 0 13 -12 -0.25 13 -11.5 0 14 -18 0 -15
  [5,24,-12,0,13,-12,-0.25,13,-11.5,0,14,-18,0,-15],
];
module ldraw_lib__s__004315s01(step=0, col=false, unit=2/5, alt=false, line=0.2, solid=!$preview)
    makepoly(ldraw_lib__s__004315s01(solid), step=step, col=col, unit=unit, alt=alt, line=line, solid=solid);
ldraw_lib__s__004315s01(line=0.2);
// main file
use <../lib.scad>
use <s/004315s01.scad>
$fa=1; $fs=0.2;
function ldraw_lib__199013a(realsolid=false) = [
// 0 Sticker Minifig Torso with Classic Space Logo on White Background
// 0 Name: 199013a.dat
// 0 Author: Takeshi Takahashi [RainbowDolphin]
// 0 !LDRAW_ORG Part UPDATE 2022-01
// 0 !LICENSE Licensed under CC BY 2.0 and CC BY 4.0 : see CAreadme.txt
// 
// 0 BFC CERTIFY CCW
  [0,"BFC","CERTIFY"],
  [0,"BFC","CCW"],
// 
// 0 !KEYWORDS Set 891, Set 926
// 
// 0 !HISTORY 2022-01-14 [PTadmin] Official Update 2022-01
// 
// 
// 1 16 0 0 0 1 0 0 0 1 0 0 0 1 s\004315s01.dat
  [1,16,0,0,0,1,0,0,0,1,0,0,0,1, ldraw_lib__s__004315s01(realsolid)],
// 4 15 -4.148 -.25 .766 .701 -.25 2.669 .577 -.25 2.973 -4.24 -.25 1.105
  [4,15,-4.148,-.25,.766,.701,-.25,2.669,.577,-.25,2.973,-4.24,-.25,1.105],
// 4 15 -4.661 -.25 2.477 -8.046 -.25 .985 -4.54 -.25 2.12 .061 -.25 4.282
  [4,15,-4.661,-.25,2.477,-8.046,-.25,.985,-4.54,-.25,2.12,.061,-.25,4.282],
// 4 15 .061 -.25 4.282 -4.54 -.25 2.12 .185 -.25 3.966 2.278 -.25 5.261
  [4,15,.061,-.25,4.282,-4.54,-.25,2.12,.185,-.25,3.966,2.278,-.25,5.261],
// 4 15 5.916 -.25 5.433 6.345 -.25 5.627 5.841 -.25 6.568 5.444 -.25 6.378
  [4,15,5.916,-.25,5.433,6.345,-.25,5.627,5.841,-.25,6.568,5.444,-.25,6.378],
// 4 15 4.876 -.25 4.928 5.298 -.25 5.133 4.835 -.25 6.083 4.426 -.25 5.885
  [4,15,4.876,-.25,4.928,5.298,-.25,5.133,4.835,-.25,6.083,4.426,-.25,5.885],
// 4 15 3.414 -.25 4.218 3.853 -.25 4.431 3.42 -.25 5.398 3.009 -.25 5.199
  [4,15,3.414,-.25,4.218,3.853,-.25,4.431,3.42,-.25,5.398,3.009,-.25,5.199],
// 4 15 -10.892 -.25 .664 -10.881 -.25 .97 -11.799 -.25 1.032 -11.654 -.25 .729
  [4,15,-10.892,-.25,.664,-10.881,-.25,.97,-11.799,-.25,1.032,-11.654,-.25,.729],
// 4 82 -8.091 -.25 1.875 -7.8232 -.25 1.4545 -4.661 -.25 2.477 -8.106 -.25 6.104
  [4,82,-8.091,-.25,1.875,-7.8232,-.25,1.4545,-4.661,-.25,2.477,-8.106,-.25,6.104],
// 3 82 -8.106 -.25 6.104 -8.528 -.25 3.995 -8.091 -.25 1.875
  [3,82,-8.106,-.25,6.104,-8.528,-.25,3.995,-8.091,-.25,1.875],
// 4 82 -8.106 -.25 6.104 -4.661 -.25 2.477 -5.109 -.25 9.092 -6.901 -.25 7.891
  [4,82,-8.106,-.25,6.104,-4.661,-.25,2.477,-5.109,-.25,9.092,-6.901,-.25,7.891],
// 4 82 -4.661 -.25 2.477 .061 -.25 4.282 -2.999 -.25 9.512 -5.109 -.25 9.092
  [4,82,-4.661,-.25,2.477,.061,-.25,4.282,-2.999,-.25,9.512,-5.109,-.25,9.092],
// 4 82 .912 -.25 7.892 -.881 -.25 9.088 -2.999 -.25 9.512 .061 -.25 4.282
  [4,82,.912,-.25,7.892,-.881,-.25,9.088,-2.999,-.25,9.512,.061,-.25,4.282],
// 4 82 2.278 -.25 5.261 2.11 -.25 6.101 .912 -.25 7.892 .061 -.25 4.282
  [4,82,2.278,-.25,5.261,2.11,-.25,6.101,.912,-.25,7.892,.061,-.25,4.282],
// 4 82 .913 -.25 .076 2.11 -.25 1.876 2.421 -.25 3.435 .701 -.25 2.669
  [4,82,.913,-.25,.076,2.11,-.25,1.876,2.421,-.25,3.435,.701,-.25,2.669],
// 4 82 -.877 -.25 -1.12 .913 -.25 .076 .701 -.25 2.669 -2.992 -.25 -1.545
  [4,82,-.877,-.25,-1.12,.913,-.25,.076,.701,-.25,2.669,-2.992,-.25,-1.545],
// 4 82 -5.104 -.25 -1.119 -2.992 -.25 -1.545 .701 -.25 2.669 -4.148 -.25 .766
  [4,82,-5.104,-.25,-1.119,-2.992,-.25,-1.545,.701,-.25,2.669,-4.148,-.25,.766],
// 3 82 -4.148 -.25 .766 -6.707 -.25 -.047 -5.104 -.25 -1.119
  [3,82,-4.148,-.25,.766,-6.707,-.25,-.047,-5.104,-.25,-1.119],
// 4 4 11.41 -.25 8.437 11.399 -.25 8.858 11.053 -.25 9.118 11.203 -.25 8.137
  [4,4,11.41,-.25,8.437,11.399,-.25,8.858,11.053,-.25,9.118,11.203,-.25,8.137],
// 4 4 11.203 -.25 8.137 11.053 -.25 9.118 10.667 -.25 9.153 10.949 -.25 7.878
  [4,4,11.203,-.25,8.137,11.053,-.25,9.118,10.667,-.25,9.153,10.949,-.25,7.878],
// 4 4 10.949 -.25 7.878 10.667 -.25 9.153 10.321 -.25 9.083 10.32 -.25 7.38
  [4,4,10.949,-.25,7.878,10.667,-.25,9.153,10.321,-.25,9.083,10.32,-.25,7.38],
// 4 4 10.32 -.25 7.38 10.321 -.25 9.083 9.548 -.25 8.845 9.654 -.25 6.633
  [4,4,10.32,-.25,7.38,10.321,-.25,9.083,9.548,-.25,8.845,9.654,-.25,6.633],
// 4 4 9.654 -.25 6.633 9.548 -.25 8.845 8.565 -.25 8.71 7.443 -.25 5.807
  [4,4,9.654,-.25,6.633,9.548,-.25,8.845,8.565,-.25,8.71,7.443,-.25,5.807],
// 4 4 6.613 -.25 7.382 7.443 -.25 5.807 8.565 -.25 8.71 7.198 -.25 9.21
  [4,4,6.613,-.25,7.382,7.443,-.25,5.807,8.565,-.25,8.71,7.198,-.25,9.21],
// 3 4 7.198 -.25 9.21 6.431 -.25 8.794 6.613 -.25 7.382
  [3,4,7.198,-.25,9.21,6.431,-.25,8.794,6.613,-.25,7.382],
// 4 4 8.485 -.25 4.851 9.292 -.25 5.284 9.654 -.25 6.633 7.443 -.25 5.807
  [4,4,8.485,-.25,4.851,9.292,-.25,5.284,9.654,-.25,6.633,7.443,-.25,5.807],
// 4 4 6.345 -.25 5.627 7.443 -.25 5.807 6.613 -.25 7.382 5.841 -.25 6.568
  [4,4,6.345,-.25,5.627,7.443,-.25,5.807,6.613,-.25,7.382,5.841,-.25,6.568],
// 4 4 5.298 -.25 5.133 5.916 -.25 5.433 5.444 -.25 6.378 4.835 -.25 6.083
  [4,4,5.298,-.25,5.133,5.916,-.25,5.433,5.444,-.25,6.378,4.835,-.25,6.083],
// 4 4 3.853 -.25 4.431 4.876 -.25 4.928 4.426 -.25 5.885 3.42 -.25 5.398
  [4,4,3.853,-.25,4.431,4.876,-.25,4.928,4.426,-.25,5.885,3.42,-.25,5.398],
// 4 4 .577 -.25 2.973 3.414 -.25 4.218 3.009 -.25 5.199 .185 -.25 3.966
  [4,4,.577,-.25,2.973,3.414,-.25,4.218,3.009,-.25,5.199,.185,-.25,3.966],
// 4 4 -4.24 -.25 1.105 .577 -.25 2.973 .185 -.25 3.966 -4.54 -.25 2.12
  [4,4,-4.24,-.25,1.105,.577,-.25,2.973,.185,-.25,3.966,-4.54,-.25,2.12],
// 4 4 -7.429 -.25 .073 -4.24 -.25 1.105 -4.54 -.25 2.12 -8.046 -.25 .985
  [4,4,-7.429,-.25,.073,-4.24,-.25,1.105,-4.54,-.25,2.12,-8.046,-.25,.985],
// 4 4 -9.449 -.25 -.326 -7.429 -.25 .073 -8.046 -.25 .985 -9.227 -.25 .701
  [4,4,-9.449,-.25,-.326,-7.429,-.25,.073,-8.046,-.25,.985,-9.227,-.25,.701],
// 4 4 -10.299 -.25 -.387 -9.449 -.25 -.326 -9.227 -.25 .701 -10.001 -.25 .652
  [4,4,-10.299,-.25,-.387,-9.449,-.25,-.326,-9.227,-.25,.701,-10.001,-.25,.652],
// 4 4 -11.178 -.25 -.28 -10.299 -.25 -.387 -10.001 -.25 .652 -10.53 -.25 .671
  [4,4,-11.178,-.25,-.28,-10.299,-.25,-.387,-10.001,-.25,.652,-10.53,-.25,.671],
// 3 4 -10.53 -.25 .671 -10.892 -.25 .664 -11.178 -.25 -.28
  [3,4,-10.53,-.25,.671,-10.892,-.25,.664,-11.178,-.25,-.28],
// 3 4 -11.654 -.25 .729 -11.178 -.25 -.28 -10.892 -.25 .664
  [3,4,-11.654,-.25,.729,-11.178,-.25,-.28,-10.892,-.25,.664],
// 4 4 -10.881 -.25 .97 -10.938 -.25 1.223 -11.953 -.25 1.281 -11.799 -.25 1.032
  [4,4,-10.881,-.25,.97,-10.938,-.25,1.223,-11.953,-.25,1.281,-11.799,-.25,1.032],
// 4 4 -10.938 -.25 1.223 -10.708 -.25 1.523 -11.8 -.25 1.707 -11.953 -.25 1.281
  [4,4,-10.938,-.25,1.223,-10.708,-.25,1.523,-11.8,-.25,1.707,-11.953,-.25,1.281],
// 4 4 -10.708 -.25 1.523 -9.849 -.25 2.135 -10.535 -.25 2.631 -11.8 -.25 1.707
  [4,4,-10.708,-.25,1.523,-9.849,-.25,2.135,-10.535,-.25,2.631,-11.8,-.25,1.707],
// 4 4 -9.849 -.25 2.135 -8.7344 -.25 2.7797 -8.9054 -.25 3.6477 -10.535 -.25 2.631
  [4,4,-9.849,-.25,2.135,-8.7344,-.25,2.7797,-8.9054,-.25,3.6477,-10.535,-.25,2.631],
// 4 15 -8.528 -.25 3.995 -8.9054 -.25 3.6477 -8.7344 -.25 2.7797 -8.091 -.25 1.875
  [4,15,-8.528,-.25,3.995,-8.9054,-.25,3.6477,-8.7344,-.25,2.7797,-8.091,-.25,1.875],
// 3 15 -4.661 -.25 2.477 -7.8232 -.25 1.4545 -8.046 -.25 .985
  [3,15,-4.661,-.25,2.477,-7.8232,-.25,1.4545,-8.046,-.25,.985],
// 4 15 -4.24 -.25 1.105 -7.429 -.25 .073 -6.707 -.25 -.047 -4.148 -.25 .766
  [4,15,-4.24,-.25,1.105,-7.429,-.25,.073,-6.707,-.25,-.047,-4.148,-.25,.766],
// 4 15 .577 -.25 2.973 .701 -.25 2.669 2.421 -.25 3.435 3.414 -.25 4.218
  [4,15,.577,-.25,2.973,.701,-.25,2.669,2.421,-.25,3.435,3.414,-.25,4.218],
// 4 15 2.278 -.25 5.261 .185 -.25 3.966 3.009 -.25 5.199 3.42 -.25 5.398
  [4,15,2.278,-.25,5.261,.185,-.25,3.966,3.009,-.25,5.199,3.42,-.25,5.398],
// 4 15 -8.091 -.25 1.875 -8.7344 -.25 2.7797 -9.849 -.25 2.135 -7.8232 -.25 1.4545
  [4,15,-8.091,-.25,1.875,-8.7344,-.25,2.7797,-9.849,-.25,2.135,-7.8232,-.25,1.4545],
// 4 15 -8.046 -.25 .985 -7.8232 -.25 1.4545 -9.849 -.25 2.135 -9.227 -.25 .701
  [4,15,-8.046,-.25,.985,-7.8232,-.25,1.4545,-9.849,-.25,2.135,-9.227,-.25,.701],
// 4 15 -9.227 -.25 .701 -9.849 -.25 2.135 -10.708 -.25 1.523 -10.001 -.25 .652
  [4,15,-9.227,-.25,.701,-9.849,-.25,2.135,-10.708,-.25,1.523,-10.001,-.25,.652],
// 4 15 -10.001 -.25 .652 -10.708 -.25 1.523 -10.938 -.25 1.223 -10.53 -.25 .671
  [4,15,-10.001,-.25,.652,-10.708,-.25,1.523,-10.938,-.25,1.223,-10.53,-.25,.671],
// 3 15 -10.938 -.25 1.223 -10.881 -.25 .97 -10.53 -.25 .671
  [3,15,-10.938,-.25,1.223,-10.881,-.25,.97,-10.53,-.25,.671],
// 3 15 -10.881 -.25 .97 -10.892 -.25 .664 -10.53 -.25 .671
  [3,15,-10.881,-.25,.97,-10.892,-.25,.664,-10.53,-.25,.671],
// 4 15 -2.999 -.25 9.512 8.5 -.25 15 -8.5 -.25 15 -5.109 -.25 9.092
  [4,15,-2.999,-.25,9.512,8.5,-.25,15,-8.5,-.25,15,-5.109,-.25,9.092],
// 4 15 -5.109 -.25 9.092 -8.5 -.25 15 -10 -.25 14.75 -6.901 -.25 7.891
  [4,15,-5.109,-.25,9.092,-8.5,-.25,15,-10,-.25,14.75,-6.901,-.25,7.891],
// 4 15 -6.901 -.25 7.891 -10 -.25 14.75 -11.5 -.25 14 -12 -.25 13
  [4,15,-6.901,-.25,7.891,-10,-.25,14.75,-11.5,-.25,14,-12,-.25,13],
// 3 15 -12 -.25 13 -8.106 -.25 6.104 -6.901 -.25 7.891
  [3,15,-12,-.25,13,-8.106,-.25,6.104,-6.901,-.25,7.891],
// 4 15 -8.528 -.25 3.995 -8.106 -.25 6.104 -12 -.25 13 -8.9054 -.25 3.6477
  [4,15,-8.528,-.25,3.995,-8.106,-.25,6.104,-12,-.25,13,-8.9054,-.25,3.6477],
// 3 15 -12 -.25 13 -10.535 -.25 2.631 -8.9054 -.25 3.6477
  [3,15,-12,-.25,13,-10.535,-.25,2.631,-8.9054,-.25,3.6477],
// 3 15 -12 -.25 13 -11.8 -.25 1.707 -10.535 -.25 2.631
  [3,15,-12,-.25,13,-11.8,-.25,1.707,-10.535,-.25,2.631],
// 4 15 -11.953 -.25 1.281 -11.8 -.25 1.707 -12 -.25 13 -18 -.25 -15
  [4,15,-11.953,-.25,1.281,-11.8,-.25,1.707,-12,-.25,13,-18,-.25,-15],
// 4 15 -11.799 -.25 1.032 -11.953 -.25 1.281 -18 -.25 -15 -11.654 -.25 .729
  [4,15,-11.799,-.25,1.032,-11.953,-.25,1.281,-18,-.25,-15,-11.654,-.25,.729],
// 3 15 -11.654 -.25 .729 -18 -.25 -15 -11.178 -.25 -.28
  [3,15,-11.654,-.25,.729,-18,-.25,-15,-11.178,-.25,-.28],
// 3 15 -11.178 -.25 -.28 -18 -.25 -15 -10.299 -.25 -.387
  [3,15,-11.178,-.25,-.28,-18,-.25,-15,-10.299,-.25,-.387],
// 3 15 -9.449 -.25 -.326 -10.299 -.25 -.387 -18 -.25 -15
  [3,15,-9.449,-.25,-.326,-10.299,-.25,-.387,-18,-.25,-15],
// 4 15 -7.429 -.25 .073 -9.449 -.25 -.326 -18 -.25 -15 -6.707 -.25 -.047
  [4,15,-7.429,-.25,.073,-9.449,-.25,-.326,-18,-.25,-15,-6.707,-.25,-.047],
// 3 15 -6.707 -.25 -.047 -18 -.25 -15 -5.104 -.25 -1.119
  [3,15,-6.707,-.25,-.047,-18,-.25,-15,-5.104,-.25,-1.119],
// 4 15 -2.992 -.25 -1.545 -5.104 -.25 -1.119 -18 -.25 -15 18 -.25 -15
  [4,15,-2.992,-.25,-1.545,-5.104,-.25,-1.119,-18,-.25,-15,18,-.25,-15],
// 3 15 -.877 -.25 -1.12 -2.992 -.25 -1.545 18 -.25 -15
  [3,15,-.877,-.25,-1.12,-2.992,-.25,-1.545,18,-.25,-15],
// 3 15 .913 -.25 .076 -.877 -.25 -1.12 18 -.25 -15
  [3,15,.913,-.25,.076,-.877,-.25,-1.12,18,-.25,-15],
// 3 15 2.11 -.25 1.876 .913 -.25 .076 18 -.25 -15
  [3,15,2.11,-.25,1.876,.913,-.25,.076,18,-.25,-15],
// 4 15 2.421 -.25 3.435 2.11 -.25 1.876 18 -.25 -15 3.414 -.25 4.218
  [4,15,2.421,-.25,3.435,2.11,-.25,1.876,18,-.25,-15,3.414,-.25,4.218],
// 3 15 3.853 -.25 4.431 3.414 -.25 4.218 18 -.25 -15
  [3,15,3.853,-.25,4.431,3.414,-.25,4.218,18,-.25,-15],
// 3 15 4.876 -.25 4.928 3.853 -.25 4.431 18 -.25 -15
  [3,15,4.876,-.25,4.928,3.853,-.25,4.431,18,-.25,-15],
// 3 15 5.298 -.25 5.133 4.876 -.25 4.928 18 -.25 -15
  [3,15,5.298,-.25,5.133,4.876,-.25,4.928,18,-.25,-15],
// 4 15 5.916 -.25 5.433 5.298 -.25 5.133 18 -.25 -15 6.345 -.25 5.627
  [4,15,5.916,-.25,5.433,5.298,-.25,5.133,18,-.25,-15,6.345,-.25,5.627],
// 4 15 7.443 -.25 5.807 6.345 -.25 5.627 18 -.25 -15 8.485 -.25 4.851
  [4,15,7.443,-.25,5.807,6.345,-.25,5.627,18,-.25,-15,8.485,-.25,4.851],
// 3 15 9.292 -.25 5.284 8.485 -.25 4.851 18 -.25 -15
  [3,15,9.292,-.25,5.284,8.485,-.25,4.851,18,-.25,-15],
// 4 15 9.654 -.25 6.633 9.292 -.25 5.284 18 -.25 -15 10.32 -.25 7.38
  [4,15,9.654,-.25,6.633,9.292,-.25,5.284,18,-.25,-15,10.32,-.25,7.38],
// 3 15 10.949 -.25 7.878 10.32 -.25 7.38 18 -.25 -15
  [3,15,10.949,-.25,7.878,10.32,-.25,7.38,18,-.25,-15],
// 3 15 11.203 -.25 8.137 10.949 -.25 7.878 18 -.25 -15
  [3,15,11.203,-.25,8.137,10.949,-.25,7.878,18,-.25,-15],
// 3 15 11.41 -.25 8.437 11.203 -.25 8.137 18 -.25 -15
  [3,15,11.41,-.25,8.437,11.203,-.25,8.137,18,-.25,-15],
// 4 15 11.399 -.25 8.858 11.41 -.25 8.437 18 -.25 -15 12 -.25 13
  [4,15,11.399,-.25,8.858,11.41,-.25,8.437,18,-.25,-15,12,-.25,13],
// 3 15 12 -.25 13 11.053 -.25 9.118 11.399 -.25 8.858
  [3,15,12,-.25,13,11.053,-.25,9.118,11.399,-.25,8.858],
// 3 15 12 -.25 13 10.667 -.25 9.153 11.053 -.25 9.118
  [3,15,12,-.25,13,10.667,-.25,9.153,11.053,-.25,9.118],
// 3 15 12 -.25 13 10.321 -.25 9.083 10.667 -.25 9.153
  [3,15,12,-.25,13,10.321,-.25,9.083,10.667,-.25,9.153],
// 4 15 9.548 -.25 8.845 10.321 -.25 9.083 12 -.25 13 11.5 -.25 14
  [4,15,9.548,-.25,8.845,10.321,-.25,9.083,12,-.25,13,11.5,-.25,14],
// 4 15 8.565 -.25 8.71 9.548 -.25 8.845 11.5 -.25 14 10 -.25 14.75
  [4,15,8.565,-.25,8.71,9.548,-.25,8.845,11.5,-.25,14,10,-.25,14.75],
// 4 15 7.198 -.25 9.21 8.565 -.25 8.71 10 -.25 14.75 8.5 -.25 15
  [4,15,7.198,-.25,9.21,8.565,-.25,8.71,10,-.25,14.75,8.5,-.25,15],
// 4 15 6.431 -.25 8.794 7.198 -.25 9.21 8.5 -.25 15 .912 -.25 7.892
  [4,15,6.431,-.25,8.794,7.198,-.25,9.21,8.5,-.25,15,.912,-.25,7.892],
// 4 15 6.431 -.25 8.794 .912 -.25 7.892 2.11 -.25 6.101 6.613 -.25 7.382
  [4,15,6.431,-.25,8.794,.912,-.25,7.892,2.11,-.25,6.101,6.613,-.25,7.382],
// 4 15 6.613 -.25 7.382 2.11 -.25 6.101 4.835 -.25 6.083 5.444 -.25 6.378
  [4,15,6.613,-.25,7.382,2.11,-.25,6.101,4.835,-.25,6.083,5.444,-.25,6.378],
// 3 15 6.613 -.25 7.382 5.444 -.25 6.378 5.841 -.25 6.568
  [3,15,6.613,-.25,7.382,5.444,-.25,6.378,5.841,-.25,6.568],
// 3 15 2.11 -.25 6.101 4.426 -.25 5.885 4.835 -.25 6.083
  [3,15,2.11,-.25,6.101,4.426,-.25,5.885,4.835,-.25,6.083],
// 4 15 3.42 -.25 5.398 4.426 -.25 5.885 2.11 -.25 6.101 2.278 -.25 5.261
  [4,15,3.42,-.25,5.398,4.426,-.25,5.885,2.11,-.25,6.101,2.278,-.25,5.261],
// 3 15 8.5 -.25 15 -.881 -.25 9.088 .912 -.25 7.892
  [3,15,8.5,-.25,15,-.881,-.25,9.088,.912,-.25,7.892],
// 3 15 8.5 -.25 15 -2.999 -.25 9.512 -.881 -.25 9.088
  [3,15,8.5,-.25,15,-2.999,-.25,9.512,-.881,-.25,9.088],
];
module ldraw_lib__199013a(step=0, col=false, unit=2/5, alt=false, line=0.2, solid=!$preview)
    makepoly(ldraw_lib__199013a(solid), step=step, col=col, unit=unit, alt=alt, line=line, solid=solid);
ldraw_lib__199013a(line=0.2);
